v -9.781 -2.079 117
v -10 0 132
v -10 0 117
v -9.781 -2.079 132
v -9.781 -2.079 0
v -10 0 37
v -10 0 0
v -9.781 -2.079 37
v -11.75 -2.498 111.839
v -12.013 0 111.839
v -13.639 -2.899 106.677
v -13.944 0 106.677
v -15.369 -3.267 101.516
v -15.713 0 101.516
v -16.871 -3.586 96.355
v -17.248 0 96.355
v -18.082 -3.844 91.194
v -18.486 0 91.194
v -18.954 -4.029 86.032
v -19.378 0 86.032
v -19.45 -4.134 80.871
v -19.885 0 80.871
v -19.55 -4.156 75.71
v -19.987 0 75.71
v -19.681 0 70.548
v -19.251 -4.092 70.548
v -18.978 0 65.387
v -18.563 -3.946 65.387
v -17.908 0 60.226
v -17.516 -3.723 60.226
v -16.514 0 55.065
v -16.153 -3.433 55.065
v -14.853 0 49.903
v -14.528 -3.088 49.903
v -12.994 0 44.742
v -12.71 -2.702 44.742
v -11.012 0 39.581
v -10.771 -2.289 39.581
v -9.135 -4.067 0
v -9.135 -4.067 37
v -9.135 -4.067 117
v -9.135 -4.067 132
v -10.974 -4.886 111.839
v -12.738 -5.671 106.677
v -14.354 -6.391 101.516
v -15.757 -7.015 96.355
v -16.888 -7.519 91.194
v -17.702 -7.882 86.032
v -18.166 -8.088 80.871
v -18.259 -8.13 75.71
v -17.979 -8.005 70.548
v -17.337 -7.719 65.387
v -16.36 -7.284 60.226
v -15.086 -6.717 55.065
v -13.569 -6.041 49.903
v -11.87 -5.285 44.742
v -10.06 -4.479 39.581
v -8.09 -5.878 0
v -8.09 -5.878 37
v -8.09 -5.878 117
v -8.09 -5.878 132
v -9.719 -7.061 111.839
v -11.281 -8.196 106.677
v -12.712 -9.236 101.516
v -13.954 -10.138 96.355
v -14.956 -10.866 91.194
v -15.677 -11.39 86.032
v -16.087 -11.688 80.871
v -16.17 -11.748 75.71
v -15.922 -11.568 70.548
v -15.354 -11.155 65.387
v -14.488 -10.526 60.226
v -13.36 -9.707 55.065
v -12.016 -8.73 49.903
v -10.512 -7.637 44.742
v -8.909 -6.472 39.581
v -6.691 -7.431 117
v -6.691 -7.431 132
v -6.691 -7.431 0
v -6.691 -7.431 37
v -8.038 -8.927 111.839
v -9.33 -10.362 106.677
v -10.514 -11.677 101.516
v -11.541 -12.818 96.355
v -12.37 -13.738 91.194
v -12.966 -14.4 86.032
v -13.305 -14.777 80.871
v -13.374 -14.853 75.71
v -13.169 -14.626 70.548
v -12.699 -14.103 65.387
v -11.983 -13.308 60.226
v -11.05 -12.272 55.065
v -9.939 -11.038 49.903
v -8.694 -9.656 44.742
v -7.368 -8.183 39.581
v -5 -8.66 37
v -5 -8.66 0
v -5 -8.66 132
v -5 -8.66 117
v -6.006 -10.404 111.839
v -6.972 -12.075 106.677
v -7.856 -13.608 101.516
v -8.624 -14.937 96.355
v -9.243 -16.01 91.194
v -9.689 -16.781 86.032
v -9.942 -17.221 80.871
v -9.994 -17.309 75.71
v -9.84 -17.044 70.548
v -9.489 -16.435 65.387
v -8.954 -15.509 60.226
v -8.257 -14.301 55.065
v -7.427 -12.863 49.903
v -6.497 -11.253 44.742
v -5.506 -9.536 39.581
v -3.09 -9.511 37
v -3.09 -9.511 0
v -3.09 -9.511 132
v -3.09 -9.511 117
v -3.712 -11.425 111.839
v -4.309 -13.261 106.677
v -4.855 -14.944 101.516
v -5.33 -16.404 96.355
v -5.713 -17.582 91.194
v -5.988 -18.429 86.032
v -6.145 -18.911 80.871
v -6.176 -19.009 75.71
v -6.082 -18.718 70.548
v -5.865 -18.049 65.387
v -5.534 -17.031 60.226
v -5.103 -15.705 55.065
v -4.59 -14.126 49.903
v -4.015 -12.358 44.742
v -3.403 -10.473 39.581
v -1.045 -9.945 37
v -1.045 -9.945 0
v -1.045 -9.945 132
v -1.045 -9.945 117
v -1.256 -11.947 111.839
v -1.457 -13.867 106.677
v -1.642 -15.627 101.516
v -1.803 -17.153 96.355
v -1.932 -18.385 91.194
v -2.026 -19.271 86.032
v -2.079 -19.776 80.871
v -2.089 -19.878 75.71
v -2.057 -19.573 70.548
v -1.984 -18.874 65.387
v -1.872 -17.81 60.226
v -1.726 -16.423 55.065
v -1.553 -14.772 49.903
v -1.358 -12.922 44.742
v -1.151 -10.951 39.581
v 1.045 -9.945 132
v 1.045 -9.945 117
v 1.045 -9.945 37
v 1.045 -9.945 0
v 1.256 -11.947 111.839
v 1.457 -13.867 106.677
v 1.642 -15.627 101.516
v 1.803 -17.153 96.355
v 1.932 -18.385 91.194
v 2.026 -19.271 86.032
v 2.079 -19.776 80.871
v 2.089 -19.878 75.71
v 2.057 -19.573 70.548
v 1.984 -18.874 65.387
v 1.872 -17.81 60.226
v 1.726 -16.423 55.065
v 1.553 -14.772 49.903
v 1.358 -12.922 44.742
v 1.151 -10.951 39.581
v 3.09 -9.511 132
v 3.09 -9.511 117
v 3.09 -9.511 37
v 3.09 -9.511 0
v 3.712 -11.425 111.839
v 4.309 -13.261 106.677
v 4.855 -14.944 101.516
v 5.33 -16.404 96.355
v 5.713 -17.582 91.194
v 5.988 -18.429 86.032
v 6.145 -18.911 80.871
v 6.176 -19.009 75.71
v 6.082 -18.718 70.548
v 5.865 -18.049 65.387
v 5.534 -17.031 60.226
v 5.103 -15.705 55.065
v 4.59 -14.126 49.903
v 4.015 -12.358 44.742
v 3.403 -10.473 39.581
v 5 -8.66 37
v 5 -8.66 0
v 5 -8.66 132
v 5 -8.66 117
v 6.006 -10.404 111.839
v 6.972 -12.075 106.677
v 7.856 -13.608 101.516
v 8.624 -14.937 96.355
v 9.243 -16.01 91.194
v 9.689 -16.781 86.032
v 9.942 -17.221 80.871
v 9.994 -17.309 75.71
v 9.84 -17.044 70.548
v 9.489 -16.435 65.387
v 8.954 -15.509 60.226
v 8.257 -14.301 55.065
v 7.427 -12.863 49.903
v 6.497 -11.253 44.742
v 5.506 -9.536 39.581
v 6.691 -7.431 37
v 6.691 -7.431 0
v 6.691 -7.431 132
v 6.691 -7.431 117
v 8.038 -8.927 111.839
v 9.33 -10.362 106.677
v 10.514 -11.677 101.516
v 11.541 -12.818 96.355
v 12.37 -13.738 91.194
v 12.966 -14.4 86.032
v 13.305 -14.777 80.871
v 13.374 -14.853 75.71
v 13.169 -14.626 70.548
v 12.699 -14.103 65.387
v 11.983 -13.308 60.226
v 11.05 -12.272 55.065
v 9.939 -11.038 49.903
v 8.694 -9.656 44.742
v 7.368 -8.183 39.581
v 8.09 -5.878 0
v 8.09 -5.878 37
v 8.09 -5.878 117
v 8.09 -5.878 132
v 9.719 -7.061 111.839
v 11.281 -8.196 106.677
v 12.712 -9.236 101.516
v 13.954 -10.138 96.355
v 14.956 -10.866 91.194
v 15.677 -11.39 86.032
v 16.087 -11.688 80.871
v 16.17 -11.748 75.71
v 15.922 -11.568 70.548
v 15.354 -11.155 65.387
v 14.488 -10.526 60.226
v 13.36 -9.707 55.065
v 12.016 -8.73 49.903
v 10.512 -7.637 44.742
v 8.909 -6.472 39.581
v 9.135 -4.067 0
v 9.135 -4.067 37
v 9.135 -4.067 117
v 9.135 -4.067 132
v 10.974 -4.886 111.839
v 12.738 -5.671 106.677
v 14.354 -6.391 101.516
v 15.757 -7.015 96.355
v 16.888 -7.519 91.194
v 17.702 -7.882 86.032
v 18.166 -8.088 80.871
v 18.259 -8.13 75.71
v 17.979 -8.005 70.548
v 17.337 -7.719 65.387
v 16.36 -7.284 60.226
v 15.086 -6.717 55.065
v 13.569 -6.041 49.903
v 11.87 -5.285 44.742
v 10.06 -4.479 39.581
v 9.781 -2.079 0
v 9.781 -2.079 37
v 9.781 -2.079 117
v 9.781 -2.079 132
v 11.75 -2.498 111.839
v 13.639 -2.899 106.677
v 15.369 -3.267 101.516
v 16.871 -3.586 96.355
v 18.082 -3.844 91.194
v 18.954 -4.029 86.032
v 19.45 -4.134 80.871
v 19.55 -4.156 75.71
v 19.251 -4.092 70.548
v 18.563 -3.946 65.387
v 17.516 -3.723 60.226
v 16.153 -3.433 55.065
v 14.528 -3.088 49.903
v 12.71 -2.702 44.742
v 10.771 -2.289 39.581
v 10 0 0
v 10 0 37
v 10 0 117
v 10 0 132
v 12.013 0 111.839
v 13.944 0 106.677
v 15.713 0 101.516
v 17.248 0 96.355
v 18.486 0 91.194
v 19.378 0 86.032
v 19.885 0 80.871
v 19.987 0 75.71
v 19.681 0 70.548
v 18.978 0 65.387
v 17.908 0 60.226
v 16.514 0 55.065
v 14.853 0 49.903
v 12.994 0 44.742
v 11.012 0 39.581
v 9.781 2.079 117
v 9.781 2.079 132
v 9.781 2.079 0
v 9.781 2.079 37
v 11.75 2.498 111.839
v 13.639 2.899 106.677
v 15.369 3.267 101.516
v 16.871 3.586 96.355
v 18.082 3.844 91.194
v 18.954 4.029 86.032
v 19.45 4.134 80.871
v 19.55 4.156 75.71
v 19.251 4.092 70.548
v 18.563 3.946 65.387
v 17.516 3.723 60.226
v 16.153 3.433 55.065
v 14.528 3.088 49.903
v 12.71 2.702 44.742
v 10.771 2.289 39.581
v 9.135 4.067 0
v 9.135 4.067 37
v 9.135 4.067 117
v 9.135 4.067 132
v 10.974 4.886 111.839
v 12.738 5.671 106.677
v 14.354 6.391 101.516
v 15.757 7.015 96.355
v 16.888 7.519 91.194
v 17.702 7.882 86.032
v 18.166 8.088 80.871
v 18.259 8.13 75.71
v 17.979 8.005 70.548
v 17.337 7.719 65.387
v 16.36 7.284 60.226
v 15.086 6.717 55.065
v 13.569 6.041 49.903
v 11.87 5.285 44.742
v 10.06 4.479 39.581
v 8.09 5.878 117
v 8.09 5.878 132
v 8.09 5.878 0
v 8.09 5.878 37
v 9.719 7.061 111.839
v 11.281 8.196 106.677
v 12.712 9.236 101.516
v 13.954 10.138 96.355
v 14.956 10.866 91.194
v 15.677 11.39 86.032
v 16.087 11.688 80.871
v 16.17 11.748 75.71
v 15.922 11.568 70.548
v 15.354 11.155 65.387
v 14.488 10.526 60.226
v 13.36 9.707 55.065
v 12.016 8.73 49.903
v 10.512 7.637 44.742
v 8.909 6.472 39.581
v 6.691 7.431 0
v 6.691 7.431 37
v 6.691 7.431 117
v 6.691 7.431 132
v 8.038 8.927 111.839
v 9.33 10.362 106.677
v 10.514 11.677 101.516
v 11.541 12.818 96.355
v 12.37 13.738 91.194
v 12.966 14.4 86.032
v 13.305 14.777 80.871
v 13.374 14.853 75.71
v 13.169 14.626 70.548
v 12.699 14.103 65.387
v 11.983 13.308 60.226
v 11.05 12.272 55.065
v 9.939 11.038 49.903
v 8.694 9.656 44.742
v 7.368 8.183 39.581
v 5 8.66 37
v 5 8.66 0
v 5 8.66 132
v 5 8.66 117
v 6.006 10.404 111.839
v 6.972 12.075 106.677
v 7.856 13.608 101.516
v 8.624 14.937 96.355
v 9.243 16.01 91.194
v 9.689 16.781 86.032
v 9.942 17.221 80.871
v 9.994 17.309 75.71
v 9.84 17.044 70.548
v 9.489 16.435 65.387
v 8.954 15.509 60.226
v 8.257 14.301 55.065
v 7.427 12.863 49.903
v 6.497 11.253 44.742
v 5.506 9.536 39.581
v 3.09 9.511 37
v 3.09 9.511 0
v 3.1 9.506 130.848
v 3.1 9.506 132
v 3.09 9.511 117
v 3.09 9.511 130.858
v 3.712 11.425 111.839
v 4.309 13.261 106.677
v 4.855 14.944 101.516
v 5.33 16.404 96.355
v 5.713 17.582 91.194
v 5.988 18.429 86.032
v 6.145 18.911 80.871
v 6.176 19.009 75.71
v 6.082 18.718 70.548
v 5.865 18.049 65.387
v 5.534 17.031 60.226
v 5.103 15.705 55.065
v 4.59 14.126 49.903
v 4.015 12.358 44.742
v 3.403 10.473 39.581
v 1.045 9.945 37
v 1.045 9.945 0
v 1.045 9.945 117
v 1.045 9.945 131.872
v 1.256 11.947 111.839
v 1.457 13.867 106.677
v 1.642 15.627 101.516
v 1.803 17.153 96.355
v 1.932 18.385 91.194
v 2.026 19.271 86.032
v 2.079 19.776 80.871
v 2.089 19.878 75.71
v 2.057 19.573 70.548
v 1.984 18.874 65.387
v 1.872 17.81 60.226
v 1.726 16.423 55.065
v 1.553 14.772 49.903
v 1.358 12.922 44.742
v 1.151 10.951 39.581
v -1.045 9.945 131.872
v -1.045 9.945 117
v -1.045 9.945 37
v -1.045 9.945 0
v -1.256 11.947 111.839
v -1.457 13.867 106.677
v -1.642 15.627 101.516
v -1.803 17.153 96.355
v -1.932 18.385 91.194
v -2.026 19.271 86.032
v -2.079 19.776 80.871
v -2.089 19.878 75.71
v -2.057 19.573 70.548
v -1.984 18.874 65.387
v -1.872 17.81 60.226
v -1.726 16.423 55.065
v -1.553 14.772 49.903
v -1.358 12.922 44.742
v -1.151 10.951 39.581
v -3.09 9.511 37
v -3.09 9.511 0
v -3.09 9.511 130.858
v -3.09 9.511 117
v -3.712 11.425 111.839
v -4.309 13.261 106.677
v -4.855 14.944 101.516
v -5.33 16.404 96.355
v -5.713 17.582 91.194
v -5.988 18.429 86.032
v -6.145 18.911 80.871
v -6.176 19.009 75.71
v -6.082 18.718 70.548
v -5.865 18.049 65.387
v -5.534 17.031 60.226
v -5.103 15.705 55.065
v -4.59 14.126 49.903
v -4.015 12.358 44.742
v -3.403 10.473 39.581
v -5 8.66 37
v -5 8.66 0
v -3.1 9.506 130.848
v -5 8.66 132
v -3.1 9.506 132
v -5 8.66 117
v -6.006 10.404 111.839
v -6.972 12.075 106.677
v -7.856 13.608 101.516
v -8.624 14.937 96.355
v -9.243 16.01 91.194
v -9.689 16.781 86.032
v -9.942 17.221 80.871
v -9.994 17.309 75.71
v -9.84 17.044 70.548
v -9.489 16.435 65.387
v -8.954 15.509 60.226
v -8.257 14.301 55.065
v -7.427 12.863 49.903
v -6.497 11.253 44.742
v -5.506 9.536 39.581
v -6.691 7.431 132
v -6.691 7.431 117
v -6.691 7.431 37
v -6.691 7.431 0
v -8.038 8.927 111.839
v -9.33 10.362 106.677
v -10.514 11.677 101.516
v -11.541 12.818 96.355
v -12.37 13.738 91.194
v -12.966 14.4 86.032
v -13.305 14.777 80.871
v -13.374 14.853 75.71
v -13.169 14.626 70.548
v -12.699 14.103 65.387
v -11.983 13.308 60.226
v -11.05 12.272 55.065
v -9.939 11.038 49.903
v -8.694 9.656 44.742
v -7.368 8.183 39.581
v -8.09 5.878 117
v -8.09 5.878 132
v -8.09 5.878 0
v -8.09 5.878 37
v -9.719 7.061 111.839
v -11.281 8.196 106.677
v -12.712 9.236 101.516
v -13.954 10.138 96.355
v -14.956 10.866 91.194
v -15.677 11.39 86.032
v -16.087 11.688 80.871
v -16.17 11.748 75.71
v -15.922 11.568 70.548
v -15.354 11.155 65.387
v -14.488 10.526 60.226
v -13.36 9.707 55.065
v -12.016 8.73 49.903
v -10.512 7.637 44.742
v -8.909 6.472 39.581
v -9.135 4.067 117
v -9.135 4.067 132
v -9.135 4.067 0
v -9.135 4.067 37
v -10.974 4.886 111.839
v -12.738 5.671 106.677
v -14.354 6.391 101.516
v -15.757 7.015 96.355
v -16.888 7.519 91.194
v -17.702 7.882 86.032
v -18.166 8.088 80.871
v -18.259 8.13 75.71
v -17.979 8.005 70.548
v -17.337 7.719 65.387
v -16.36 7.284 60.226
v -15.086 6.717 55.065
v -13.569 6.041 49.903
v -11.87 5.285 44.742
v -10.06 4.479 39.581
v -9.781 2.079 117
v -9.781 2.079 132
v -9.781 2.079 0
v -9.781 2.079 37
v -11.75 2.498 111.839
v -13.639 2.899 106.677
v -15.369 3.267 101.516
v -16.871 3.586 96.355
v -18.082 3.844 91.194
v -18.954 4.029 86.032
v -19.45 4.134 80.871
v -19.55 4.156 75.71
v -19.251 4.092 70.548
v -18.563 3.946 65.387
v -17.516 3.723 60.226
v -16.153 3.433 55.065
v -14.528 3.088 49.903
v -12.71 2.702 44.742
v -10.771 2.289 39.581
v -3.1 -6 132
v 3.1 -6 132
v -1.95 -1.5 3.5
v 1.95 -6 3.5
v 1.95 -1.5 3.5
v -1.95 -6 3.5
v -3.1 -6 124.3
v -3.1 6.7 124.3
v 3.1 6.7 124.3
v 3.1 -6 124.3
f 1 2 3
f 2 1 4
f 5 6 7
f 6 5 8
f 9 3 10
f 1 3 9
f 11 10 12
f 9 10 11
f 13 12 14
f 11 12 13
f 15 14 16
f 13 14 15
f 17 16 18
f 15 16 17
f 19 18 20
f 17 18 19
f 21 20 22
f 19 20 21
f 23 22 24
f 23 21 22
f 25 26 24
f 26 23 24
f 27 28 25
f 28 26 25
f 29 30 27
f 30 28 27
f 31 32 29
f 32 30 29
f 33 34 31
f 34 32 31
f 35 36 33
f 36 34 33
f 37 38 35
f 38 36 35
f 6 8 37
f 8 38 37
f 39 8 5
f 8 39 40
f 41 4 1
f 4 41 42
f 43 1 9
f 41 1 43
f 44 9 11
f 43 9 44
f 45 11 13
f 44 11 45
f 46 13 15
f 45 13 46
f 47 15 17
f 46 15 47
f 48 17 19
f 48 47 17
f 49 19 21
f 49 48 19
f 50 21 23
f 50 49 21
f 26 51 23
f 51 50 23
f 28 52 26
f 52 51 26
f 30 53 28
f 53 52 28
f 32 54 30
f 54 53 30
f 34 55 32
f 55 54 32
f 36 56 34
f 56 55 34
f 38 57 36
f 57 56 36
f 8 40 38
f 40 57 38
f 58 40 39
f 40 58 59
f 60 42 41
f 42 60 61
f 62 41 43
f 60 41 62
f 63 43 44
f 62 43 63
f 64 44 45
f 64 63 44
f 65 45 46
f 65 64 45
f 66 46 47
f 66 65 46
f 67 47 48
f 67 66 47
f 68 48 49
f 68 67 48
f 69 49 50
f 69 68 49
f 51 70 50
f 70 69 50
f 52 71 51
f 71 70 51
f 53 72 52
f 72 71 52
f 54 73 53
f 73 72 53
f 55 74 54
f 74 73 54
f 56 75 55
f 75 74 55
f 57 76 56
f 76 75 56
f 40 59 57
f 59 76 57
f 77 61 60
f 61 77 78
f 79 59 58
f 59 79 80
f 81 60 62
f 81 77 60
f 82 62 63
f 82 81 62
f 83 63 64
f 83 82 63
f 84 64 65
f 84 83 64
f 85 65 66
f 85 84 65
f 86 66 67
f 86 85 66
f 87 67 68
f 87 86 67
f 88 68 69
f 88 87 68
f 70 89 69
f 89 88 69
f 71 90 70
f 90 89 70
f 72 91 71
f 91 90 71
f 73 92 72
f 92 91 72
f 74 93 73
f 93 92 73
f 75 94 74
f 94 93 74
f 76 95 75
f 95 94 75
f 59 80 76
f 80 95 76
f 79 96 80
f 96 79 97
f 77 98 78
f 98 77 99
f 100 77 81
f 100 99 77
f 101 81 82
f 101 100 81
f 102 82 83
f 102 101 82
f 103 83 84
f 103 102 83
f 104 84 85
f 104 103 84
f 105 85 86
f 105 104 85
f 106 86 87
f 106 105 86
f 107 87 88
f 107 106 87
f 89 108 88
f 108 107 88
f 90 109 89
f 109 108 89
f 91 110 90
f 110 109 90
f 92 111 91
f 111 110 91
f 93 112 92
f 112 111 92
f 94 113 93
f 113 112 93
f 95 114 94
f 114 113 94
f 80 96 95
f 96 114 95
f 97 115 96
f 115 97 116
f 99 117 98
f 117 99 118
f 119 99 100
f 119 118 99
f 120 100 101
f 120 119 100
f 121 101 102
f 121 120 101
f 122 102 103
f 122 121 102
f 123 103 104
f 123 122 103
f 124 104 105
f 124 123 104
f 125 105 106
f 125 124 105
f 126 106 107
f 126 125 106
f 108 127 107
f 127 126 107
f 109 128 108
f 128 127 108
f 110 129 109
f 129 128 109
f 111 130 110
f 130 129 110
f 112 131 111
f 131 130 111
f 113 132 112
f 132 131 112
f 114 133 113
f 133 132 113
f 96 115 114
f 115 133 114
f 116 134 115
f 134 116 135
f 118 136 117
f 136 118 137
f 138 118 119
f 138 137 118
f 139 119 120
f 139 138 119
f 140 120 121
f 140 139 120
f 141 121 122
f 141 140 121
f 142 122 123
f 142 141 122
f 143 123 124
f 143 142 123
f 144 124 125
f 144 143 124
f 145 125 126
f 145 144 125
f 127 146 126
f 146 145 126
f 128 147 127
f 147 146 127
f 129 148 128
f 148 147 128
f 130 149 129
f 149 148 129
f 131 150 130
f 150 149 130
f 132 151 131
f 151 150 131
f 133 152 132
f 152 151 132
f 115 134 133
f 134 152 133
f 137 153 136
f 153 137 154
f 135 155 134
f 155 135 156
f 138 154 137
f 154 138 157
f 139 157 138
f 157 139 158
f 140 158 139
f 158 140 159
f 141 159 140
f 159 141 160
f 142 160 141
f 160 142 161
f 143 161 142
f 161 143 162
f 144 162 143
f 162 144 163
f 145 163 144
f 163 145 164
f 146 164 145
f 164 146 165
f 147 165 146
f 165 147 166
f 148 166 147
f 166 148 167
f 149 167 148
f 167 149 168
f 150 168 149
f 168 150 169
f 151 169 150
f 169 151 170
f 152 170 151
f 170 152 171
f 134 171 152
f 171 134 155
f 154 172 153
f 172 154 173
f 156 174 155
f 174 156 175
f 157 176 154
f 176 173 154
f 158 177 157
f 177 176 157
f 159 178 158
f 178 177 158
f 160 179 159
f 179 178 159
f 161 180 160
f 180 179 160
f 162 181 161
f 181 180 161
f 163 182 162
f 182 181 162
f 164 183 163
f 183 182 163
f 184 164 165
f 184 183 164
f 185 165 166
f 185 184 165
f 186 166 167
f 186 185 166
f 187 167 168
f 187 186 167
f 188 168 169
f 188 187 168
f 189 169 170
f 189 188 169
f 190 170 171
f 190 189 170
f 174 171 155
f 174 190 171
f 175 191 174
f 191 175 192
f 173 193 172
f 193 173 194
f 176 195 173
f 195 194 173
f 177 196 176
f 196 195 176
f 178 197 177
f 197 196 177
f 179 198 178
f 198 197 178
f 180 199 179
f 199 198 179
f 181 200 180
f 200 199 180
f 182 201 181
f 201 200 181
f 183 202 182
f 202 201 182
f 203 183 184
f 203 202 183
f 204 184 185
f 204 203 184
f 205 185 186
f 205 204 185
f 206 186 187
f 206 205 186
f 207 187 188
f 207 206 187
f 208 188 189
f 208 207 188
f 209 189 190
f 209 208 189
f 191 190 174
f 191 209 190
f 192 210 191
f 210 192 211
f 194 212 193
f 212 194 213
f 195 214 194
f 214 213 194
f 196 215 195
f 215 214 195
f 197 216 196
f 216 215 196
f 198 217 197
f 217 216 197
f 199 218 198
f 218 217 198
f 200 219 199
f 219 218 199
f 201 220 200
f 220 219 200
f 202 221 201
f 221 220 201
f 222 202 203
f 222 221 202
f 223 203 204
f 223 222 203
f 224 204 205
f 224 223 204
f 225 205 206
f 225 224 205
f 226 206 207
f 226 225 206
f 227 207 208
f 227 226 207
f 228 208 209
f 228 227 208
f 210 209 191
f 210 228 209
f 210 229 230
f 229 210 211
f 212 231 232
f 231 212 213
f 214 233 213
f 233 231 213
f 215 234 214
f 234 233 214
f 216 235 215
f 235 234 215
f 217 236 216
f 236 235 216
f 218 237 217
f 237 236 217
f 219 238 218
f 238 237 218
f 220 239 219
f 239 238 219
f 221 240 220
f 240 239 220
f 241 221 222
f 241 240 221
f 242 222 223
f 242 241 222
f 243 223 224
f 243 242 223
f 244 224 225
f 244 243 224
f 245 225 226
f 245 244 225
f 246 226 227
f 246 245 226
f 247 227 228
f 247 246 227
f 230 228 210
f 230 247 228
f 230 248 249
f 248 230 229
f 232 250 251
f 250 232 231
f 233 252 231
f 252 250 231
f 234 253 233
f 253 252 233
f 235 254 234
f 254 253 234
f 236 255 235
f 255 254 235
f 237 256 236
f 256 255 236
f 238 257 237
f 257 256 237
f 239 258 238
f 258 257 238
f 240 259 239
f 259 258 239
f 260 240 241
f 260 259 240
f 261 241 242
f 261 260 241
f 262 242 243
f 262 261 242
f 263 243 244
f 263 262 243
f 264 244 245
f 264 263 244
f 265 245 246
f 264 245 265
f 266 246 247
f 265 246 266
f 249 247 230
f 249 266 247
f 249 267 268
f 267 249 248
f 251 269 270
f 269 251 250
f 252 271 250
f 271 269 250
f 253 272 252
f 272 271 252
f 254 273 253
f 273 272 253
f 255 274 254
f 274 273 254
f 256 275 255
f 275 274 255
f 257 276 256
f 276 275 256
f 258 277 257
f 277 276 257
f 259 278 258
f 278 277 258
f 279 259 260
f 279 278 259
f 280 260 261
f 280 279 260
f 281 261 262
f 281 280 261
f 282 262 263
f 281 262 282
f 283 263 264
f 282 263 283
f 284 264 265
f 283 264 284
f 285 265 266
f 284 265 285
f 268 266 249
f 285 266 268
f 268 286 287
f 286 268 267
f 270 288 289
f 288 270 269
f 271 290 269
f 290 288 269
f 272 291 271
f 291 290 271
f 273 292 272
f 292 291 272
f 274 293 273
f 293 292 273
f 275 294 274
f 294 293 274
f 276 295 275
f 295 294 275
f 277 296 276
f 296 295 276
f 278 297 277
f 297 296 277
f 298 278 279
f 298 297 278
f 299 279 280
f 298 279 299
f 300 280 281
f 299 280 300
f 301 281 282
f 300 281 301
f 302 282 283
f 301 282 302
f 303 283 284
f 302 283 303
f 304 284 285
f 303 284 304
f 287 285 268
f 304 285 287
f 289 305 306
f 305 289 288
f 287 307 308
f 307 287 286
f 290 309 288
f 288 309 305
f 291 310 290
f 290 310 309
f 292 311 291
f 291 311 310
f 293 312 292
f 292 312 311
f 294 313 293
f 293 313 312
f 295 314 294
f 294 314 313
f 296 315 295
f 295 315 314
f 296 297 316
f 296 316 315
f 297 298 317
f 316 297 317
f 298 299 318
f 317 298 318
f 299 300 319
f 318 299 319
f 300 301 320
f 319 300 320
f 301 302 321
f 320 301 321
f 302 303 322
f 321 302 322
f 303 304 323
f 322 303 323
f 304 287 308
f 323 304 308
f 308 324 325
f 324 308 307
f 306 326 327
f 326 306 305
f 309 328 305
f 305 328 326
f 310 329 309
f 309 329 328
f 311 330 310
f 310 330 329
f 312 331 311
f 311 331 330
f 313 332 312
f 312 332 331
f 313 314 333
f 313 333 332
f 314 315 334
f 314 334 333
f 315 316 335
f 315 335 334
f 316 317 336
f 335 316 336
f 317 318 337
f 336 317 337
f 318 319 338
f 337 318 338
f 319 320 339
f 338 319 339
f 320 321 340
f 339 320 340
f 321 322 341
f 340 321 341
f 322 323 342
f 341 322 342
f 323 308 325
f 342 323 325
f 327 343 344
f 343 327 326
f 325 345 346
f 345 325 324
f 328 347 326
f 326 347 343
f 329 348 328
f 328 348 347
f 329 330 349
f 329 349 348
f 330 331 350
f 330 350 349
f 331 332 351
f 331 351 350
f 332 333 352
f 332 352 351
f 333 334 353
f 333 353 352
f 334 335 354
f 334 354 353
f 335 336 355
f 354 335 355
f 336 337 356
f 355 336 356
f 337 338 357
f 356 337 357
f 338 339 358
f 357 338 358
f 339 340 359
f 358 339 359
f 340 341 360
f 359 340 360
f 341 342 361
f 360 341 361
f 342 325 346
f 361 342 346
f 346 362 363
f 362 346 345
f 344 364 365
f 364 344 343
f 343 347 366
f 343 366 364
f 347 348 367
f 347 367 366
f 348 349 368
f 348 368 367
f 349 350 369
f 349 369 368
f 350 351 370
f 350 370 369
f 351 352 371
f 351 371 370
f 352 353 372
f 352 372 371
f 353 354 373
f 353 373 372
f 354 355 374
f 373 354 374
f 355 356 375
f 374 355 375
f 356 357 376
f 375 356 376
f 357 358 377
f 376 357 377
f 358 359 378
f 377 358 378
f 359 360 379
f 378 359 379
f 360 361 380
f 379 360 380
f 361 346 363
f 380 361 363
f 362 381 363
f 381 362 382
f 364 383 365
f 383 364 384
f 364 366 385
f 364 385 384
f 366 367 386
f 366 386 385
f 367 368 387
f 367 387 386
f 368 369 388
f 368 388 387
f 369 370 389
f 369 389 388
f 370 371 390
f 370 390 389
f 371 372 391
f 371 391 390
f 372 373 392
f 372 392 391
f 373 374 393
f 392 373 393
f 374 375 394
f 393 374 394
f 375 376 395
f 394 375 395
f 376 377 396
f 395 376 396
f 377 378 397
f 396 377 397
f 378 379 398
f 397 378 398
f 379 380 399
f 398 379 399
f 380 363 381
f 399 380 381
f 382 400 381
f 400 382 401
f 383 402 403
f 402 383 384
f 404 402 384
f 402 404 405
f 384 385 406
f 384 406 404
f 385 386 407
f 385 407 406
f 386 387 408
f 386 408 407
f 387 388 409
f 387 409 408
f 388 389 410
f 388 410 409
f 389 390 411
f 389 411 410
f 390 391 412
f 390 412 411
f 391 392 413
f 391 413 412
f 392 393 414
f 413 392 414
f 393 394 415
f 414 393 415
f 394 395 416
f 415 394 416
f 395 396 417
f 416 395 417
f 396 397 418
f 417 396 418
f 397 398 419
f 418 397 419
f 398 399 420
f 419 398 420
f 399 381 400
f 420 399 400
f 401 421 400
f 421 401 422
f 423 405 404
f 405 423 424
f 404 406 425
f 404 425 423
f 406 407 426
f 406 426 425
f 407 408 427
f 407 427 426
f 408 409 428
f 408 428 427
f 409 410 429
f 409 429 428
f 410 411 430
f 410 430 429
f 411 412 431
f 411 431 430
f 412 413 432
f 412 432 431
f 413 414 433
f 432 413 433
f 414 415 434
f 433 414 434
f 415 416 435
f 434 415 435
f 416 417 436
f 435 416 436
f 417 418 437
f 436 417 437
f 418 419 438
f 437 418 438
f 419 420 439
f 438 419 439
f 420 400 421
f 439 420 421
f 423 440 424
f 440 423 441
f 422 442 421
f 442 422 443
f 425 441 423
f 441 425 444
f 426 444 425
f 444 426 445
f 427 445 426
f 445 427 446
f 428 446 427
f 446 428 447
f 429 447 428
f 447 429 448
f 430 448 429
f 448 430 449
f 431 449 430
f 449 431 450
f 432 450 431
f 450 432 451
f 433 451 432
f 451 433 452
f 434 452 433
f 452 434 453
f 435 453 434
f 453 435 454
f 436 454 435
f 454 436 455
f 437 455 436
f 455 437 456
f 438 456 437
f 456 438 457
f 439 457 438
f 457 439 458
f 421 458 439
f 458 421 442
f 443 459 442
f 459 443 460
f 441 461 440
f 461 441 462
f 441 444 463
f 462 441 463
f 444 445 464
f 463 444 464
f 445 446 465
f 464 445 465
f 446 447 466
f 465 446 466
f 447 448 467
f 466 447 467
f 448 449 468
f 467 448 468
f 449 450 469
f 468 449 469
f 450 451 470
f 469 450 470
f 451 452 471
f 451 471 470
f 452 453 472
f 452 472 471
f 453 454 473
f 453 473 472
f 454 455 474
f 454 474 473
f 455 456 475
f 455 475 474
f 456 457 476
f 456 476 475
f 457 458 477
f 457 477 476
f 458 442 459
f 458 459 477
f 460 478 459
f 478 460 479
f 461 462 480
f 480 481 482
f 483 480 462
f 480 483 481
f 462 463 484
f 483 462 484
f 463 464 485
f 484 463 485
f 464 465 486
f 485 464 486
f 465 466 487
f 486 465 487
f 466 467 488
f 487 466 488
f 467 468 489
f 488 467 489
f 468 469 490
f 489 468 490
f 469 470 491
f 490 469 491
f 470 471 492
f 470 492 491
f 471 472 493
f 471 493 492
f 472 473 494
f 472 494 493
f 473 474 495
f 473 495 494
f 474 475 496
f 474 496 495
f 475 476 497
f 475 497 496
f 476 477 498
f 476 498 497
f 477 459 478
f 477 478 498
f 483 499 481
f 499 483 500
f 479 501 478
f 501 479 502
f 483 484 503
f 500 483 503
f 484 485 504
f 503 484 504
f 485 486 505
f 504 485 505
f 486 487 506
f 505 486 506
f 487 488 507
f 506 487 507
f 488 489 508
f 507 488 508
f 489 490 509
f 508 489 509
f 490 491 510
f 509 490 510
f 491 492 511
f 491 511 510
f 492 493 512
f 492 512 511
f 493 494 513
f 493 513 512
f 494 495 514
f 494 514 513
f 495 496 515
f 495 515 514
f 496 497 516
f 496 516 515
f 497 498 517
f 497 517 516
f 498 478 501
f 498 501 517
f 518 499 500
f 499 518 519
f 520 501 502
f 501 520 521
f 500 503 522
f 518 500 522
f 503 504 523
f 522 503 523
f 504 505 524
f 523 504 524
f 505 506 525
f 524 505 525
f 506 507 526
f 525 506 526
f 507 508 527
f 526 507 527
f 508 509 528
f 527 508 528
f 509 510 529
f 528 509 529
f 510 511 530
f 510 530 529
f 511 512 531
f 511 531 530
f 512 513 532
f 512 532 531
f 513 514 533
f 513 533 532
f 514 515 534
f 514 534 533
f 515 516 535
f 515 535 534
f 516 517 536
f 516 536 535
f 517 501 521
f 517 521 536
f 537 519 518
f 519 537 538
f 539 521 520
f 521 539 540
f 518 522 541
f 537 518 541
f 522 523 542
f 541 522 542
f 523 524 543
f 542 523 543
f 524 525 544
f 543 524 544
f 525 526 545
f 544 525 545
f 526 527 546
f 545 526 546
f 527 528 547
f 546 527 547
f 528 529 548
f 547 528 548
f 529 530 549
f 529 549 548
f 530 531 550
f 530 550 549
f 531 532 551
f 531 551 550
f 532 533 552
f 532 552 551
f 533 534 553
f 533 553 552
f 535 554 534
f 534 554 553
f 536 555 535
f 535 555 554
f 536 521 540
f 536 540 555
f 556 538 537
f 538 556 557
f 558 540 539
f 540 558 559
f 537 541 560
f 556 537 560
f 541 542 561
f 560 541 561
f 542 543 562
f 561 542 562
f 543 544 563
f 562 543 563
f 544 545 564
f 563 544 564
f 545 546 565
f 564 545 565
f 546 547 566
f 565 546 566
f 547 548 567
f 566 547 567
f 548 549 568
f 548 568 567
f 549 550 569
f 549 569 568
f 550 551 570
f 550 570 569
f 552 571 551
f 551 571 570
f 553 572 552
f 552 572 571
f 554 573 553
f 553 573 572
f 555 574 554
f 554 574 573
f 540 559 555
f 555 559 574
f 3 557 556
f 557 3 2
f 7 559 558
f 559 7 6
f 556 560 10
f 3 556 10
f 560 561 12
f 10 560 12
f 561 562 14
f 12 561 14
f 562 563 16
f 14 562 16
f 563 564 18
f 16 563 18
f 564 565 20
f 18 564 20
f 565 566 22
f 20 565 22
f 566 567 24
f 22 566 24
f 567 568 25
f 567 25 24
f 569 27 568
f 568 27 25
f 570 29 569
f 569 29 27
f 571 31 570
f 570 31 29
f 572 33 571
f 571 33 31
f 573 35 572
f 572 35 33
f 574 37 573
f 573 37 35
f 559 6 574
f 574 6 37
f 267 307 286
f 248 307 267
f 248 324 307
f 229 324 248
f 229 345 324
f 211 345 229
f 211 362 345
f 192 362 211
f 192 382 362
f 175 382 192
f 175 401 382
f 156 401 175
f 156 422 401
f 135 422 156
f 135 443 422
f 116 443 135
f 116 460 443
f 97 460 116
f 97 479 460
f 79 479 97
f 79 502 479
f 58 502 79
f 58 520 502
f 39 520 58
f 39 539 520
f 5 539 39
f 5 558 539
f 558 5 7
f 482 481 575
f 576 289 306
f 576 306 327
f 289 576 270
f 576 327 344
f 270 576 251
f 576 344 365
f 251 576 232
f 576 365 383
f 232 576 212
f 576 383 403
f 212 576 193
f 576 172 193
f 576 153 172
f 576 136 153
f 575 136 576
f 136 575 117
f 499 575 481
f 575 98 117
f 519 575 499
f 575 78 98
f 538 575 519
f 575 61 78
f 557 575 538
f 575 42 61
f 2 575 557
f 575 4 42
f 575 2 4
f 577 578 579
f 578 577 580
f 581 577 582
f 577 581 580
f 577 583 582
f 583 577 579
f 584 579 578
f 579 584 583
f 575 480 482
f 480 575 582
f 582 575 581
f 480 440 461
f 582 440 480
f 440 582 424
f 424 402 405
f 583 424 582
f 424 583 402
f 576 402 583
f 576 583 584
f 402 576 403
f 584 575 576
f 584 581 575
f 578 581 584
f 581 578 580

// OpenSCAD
/*
 * Print settings
 * ==============
 *
 * infill: honeycomb: 20%
 */

tang_w0 = 3.5;
tang_w1 = 5.8;
tang_w2 = 5.8;

tolerance = 0.2;

difference() {
    translate([0, 0, 80 + 52])
        rotate([0, 90, 0])
            handle();
    translate([0, 10 - 16, 80 + 52 - 128.5])
        tang();
}

module tang() {
    polyhedron(
        points=[
            [-tang_w0 / 2 - tolerance, 0, 0],
            [-tang_w0 / 2 - tolerance, 4.5, 0],
            [tang_w0 / 2 + tolerance, 4.5, 0],
            [tang_w0 / 2 + tolerance, 0, 0],

            [-tang_w1 / 2 - tolerance, 0, 120.8],
            [-tang_w1 / 2 - tolerance, 12.7, 120.8],
            [tang_w1 / 2 + tolerance, 12.7, 120.8],
            [tang_w1 / 2 + tolerance, 0, 120.8],

            [-tang_w2 / 2 - tolerance, 0, 128.5],
            [-tang_w2 / 2 - tolerance, 16, 128.5],
            [tang_w2 / 2 + tolerance, 16, 128.5],
            [tang_w2 / 2 + tolerance, 0, 128.5],
        ],
        faces=[
            [3, 2, 1, 0],
            [0, 1, 5, 4],
            [1, 2, 6, 5],
            [2, 3, 7, 6],
            [4, 7, 3, 0],
            [4, 5, 9, 8],
            [5, 6, 10, 9],
            [6, 7, 11, 10],
            [8, 11, 7, 4],
            [8, 9, 10, 11],
        ]
    );
}

module handle() {
    union() {
        difference() {
            rotate([0, 90, 0])
                rotate_extrude()
                    rotate([0, 0, 90])
                        translate([15, 10, 0])
                            sinusoid(
                                points = 32,
                                period = 160,
                                amplitude = 10,
                                thickness = 1
                            );
            translate([80 + 52, 0, 0])
                rotate([0, 90, 0])
                    cylinder(d = 40, h = 160);
        }
        rotate([0, 90, 0])
            cylinder(d = 20, h = 80 + 52);
    }
}

module sinusoid(points, period, amplitude, thickness) {
    intersection() {
        difference() {
            polygon(points = sinusoid_vectors(points = points, period = period, a = amplitude));
        }
        square([period / 2, amplitude]);
    }

    translate([-asin(thickness / amplitude) / (360 / period), 0, 0])
        intersection() {
            difference() {
                polygon(points = sinusoid_vectors(points = points, period = period, a = amplitude));
            }
            translate([period / 2, -amplitude, 0])
                square([period / 2, amplitude]);
        }
}

/**
 * @param points Total amount of points
 * @param period Length of the period
 * @param a Amplitude of the sinusoid
 *
 * @return vector Vector of [x, y] vectors
 */
function sinusoid_vectors(points, period, a = 1, res = []) =
    points == len(res)
        ? res
        : sinusoid_vectors(
            points = points,
            period = period,
            a = a,
            res = concat(
                res,
                [
                    [
                        current_point(i = len(res), n = points, size = period),
                        a * sin(current_point(i = len(res), n = points, size = 360))
                    ]
                ]
            )
        );

/**
 * @param i Current point (numbered from 0)
 * @param n Total amount of points
 * @param size Size to split by "n" points
 *
 * @return number
 */
function current_point(i, n, size) = (size / (n - 1)) * i;
